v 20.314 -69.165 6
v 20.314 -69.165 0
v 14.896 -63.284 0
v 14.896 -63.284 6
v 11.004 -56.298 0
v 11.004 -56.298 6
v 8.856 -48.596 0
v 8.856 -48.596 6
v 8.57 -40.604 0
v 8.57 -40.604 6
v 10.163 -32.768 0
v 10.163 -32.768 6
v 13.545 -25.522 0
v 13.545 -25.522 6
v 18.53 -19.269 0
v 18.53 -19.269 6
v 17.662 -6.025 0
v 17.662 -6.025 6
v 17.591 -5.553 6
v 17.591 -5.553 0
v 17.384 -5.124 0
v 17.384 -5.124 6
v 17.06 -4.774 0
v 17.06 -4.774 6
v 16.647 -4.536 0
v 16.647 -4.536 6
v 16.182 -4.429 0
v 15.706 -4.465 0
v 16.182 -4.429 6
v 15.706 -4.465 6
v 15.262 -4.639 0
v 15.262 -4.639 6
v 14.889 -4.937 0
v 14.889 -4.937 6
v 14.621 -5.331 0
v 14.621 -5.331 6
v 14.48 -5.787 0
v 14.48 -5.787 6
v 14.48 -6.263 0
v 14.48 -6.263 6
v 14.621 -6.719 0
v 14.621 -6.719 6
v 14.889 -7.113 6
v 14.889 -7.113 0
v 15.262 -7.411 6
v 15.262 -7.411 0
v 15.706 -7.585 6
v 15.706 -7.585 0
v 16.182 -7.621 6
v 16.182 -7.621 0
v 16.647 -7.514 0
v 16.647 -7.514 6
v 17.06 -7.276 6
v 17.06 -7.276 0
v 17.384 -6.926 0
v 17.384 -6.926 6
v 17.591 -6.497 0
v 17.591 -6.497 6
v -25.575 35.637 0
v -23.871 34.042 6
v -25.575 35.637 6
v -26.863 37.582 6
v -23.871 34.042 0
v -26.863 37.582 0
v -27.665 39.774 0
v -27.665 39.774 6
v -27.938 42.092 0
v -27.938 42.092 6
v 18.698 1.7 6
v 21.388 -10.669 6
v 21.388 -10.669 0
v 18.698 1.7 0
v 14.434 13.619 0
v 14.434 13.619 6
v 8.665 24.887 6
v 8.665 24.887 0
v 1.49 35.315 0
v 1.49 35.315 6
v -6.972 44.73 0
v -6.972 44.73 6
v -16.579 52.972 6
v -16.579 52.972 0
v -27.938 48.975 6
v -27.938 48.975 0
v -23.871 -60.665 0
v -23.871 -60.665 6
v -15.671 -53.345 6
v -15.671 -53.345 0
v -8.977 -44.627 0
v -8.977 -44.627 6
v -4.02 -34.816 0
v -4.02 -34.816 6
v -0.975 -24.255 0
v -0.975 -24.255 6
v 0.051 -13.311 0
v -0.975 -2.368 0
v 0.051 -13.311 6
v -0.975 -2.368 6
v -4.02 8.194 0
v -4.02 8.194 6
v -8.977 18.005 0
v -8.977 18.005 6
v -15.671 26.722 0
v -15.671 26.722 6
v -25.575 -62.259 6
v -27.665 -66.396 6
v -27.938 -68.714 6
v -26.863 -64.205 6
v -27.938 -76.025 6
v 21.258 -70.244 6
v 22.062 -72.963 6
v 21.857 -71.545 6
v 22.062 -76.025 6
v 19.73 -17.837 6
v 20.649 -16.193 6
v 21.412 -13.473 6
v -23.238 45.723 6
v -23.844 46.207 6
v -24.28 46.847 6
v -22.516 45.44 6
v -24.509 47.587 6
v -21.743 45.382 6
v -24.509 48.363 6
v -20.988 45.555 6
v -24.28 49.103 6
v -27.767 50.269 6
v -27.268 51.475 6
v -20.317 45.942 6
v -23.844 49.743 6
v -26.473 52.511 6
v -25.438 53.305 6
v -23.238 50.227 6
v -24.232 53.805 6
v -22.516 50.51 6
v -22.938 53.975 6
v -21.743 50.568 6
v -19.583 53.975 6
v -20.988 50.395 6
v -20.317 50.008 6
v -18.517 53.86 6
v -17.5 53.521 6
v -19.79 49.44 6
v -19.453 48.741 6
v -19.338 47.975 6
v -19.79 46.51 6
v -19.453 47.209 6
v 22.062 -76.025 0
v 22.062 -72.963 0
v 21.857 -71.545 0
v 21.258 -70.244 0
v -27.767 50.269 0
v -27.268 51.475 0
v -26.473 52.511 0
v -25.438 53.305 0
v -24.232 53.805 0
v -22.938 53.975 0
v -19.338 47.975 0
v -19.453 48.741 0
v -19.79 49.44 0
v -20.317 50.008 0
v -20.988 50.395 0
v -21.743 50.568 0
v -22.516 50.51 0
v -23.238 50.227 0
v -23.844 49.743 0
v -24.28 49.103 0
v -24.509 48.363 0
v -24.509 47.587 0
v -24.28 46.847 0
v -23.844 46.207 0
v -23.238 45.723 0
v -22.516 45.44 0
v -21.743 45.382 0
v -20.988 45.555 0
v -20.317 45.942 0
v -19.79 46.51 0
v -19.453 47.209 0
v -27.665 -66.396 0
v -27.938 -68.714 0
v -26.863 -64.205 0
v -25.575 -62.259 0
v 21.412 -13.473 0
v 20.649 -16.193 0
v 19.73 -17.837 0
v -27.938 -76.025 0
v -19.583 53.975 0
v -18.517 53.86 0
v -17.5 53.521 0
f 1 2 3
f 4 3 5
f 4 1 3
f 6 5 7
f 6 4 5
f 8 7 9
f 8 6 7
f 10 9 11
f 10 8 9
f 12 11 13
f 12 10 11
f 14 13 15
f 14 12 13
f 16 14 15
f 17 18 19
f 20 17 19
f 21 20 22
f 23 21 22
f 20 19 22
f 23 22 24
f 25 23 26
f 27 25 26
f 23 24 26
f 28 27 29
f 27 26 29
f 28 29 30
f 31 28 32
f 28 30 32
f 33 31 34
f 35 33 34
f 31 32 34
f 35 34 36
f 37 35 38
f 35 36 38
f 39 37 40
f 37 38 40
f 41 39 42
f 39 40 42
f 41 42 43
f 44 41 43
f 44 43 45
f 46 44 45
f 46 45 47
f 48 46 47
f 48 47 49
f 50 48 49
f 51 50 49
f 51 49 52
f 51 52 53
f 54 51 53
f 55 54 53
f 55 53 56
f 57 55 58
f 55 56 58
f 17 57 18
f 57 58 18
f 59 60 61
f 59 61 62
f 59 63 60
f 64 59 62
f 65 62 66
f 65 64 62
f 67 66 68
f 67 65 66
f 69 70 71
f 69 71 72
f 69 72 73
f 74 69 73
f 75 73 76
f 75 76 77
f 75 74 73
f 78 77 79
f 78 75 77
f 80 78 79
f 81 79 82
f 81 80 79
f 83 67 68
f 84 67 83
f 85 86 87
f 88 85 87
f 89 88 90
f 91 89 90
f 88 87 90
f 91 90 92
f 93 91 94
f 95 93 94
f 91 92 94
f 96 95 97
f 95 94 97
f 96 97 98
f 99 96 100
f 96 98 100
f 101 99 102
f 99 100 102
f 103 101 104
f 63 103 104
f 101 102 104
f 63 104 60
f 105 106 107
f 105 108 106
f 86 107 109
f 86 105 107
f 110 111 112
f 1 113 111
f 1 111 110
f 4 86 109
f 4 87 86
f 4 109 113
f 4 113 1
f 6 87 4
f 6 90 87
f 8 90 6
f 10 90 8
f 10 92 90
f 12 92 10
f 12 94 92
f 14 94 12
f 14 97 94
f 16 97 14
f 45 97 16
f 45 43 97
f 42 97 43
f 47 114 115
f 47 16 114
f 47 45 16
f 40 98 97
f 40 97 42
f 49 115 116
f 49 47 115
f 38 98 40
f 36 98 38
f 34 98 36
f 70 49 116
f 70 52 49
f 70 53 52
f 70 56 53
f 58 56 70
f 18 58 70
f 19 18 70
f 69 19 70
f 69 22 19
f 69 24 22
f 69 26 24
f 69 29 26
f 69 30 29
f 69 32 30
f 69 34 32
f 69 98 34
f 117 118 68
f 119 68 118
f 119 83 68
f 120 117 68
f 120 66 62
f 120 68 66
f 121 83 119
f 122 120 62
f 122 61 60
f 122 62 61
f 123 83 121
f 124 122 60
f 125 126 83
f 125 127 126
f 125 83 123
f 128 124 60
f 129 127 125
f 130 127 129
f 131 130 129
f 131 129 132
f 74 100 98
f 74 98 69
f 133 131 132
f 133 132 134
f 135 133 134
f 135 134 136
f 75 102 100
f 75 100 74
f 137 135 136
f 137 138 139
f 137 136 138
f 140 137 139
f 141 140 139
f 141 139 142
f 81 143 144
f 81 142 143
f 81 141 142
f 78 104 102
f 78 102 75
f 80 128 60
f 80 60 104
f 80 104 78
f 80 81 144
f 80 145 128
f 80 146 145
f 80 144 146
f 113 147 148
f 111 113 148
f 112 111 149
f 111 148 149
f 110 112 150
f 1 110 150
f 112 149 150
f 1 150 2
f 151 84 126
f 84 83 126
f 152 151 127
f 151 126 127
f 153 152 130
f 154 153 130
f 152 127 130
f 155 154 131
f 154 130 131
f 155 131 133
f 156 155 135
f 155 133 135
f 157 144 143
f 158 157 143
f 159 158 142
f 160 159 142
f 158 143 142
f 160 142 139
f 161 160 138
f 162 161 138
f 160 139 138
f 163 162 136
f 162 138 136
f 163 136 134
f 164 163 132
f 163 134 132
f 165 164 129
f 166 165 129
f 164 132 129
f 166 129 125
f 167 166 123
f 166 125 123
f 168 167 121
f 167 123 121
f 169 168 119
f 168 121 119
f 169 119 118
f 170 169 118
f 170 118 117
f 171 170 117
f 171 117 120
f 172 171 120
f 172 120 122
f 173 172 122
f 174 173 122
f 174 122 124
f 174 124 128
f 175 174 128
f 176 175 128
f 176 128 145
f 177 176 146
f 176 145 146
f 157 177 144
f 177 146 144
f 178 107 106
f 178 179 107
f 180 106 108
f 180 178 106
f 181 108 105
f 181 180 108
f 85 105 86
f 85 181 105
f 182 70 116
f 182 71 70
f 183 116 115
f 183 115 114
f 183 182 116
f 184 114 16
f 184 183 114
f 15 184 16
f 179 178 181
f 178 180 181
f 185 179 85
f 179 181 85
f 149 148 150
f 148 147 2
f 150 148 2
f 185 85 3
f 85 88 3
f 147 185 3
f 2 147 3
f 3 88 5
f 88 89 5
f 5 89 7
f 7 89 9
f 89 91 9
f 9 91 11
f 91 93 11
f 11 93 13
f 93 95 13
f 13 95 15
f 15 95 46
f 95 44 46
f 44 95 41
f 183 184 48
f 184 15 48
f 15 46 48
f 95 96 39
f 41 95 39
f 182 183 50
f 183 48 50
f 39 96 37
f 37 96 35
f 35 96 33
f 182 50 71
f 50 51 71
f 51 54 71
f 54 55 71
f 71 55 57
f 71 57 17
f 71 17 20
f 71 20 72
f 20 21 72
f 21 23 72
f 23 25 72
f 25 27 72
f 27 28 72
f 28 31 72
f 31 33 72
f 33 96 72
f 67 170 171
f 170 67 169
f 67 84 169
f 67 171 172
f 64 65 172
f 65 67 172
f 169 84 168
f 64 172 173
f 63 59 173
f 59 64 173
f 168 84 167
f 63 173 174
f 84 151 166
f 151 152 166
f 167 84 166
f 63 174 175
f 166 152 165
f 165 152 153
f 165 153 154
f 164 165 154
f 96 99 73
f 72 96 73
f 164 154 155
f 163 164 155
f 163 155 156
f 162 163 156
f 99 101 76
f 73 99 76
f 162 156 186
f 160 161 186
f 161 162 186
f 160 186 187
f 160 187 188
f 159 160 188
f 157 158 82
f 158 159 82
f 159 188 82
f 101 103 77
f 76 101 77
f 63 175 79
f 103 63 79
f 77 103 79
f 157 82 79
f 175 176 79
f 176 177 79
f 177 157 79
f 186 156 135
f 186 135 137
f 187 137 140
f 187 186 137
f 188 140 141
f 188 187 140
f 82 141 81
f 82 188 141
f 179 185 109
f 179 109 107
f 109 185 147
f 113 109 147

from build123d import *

# Parameters (mm, degrees)
ESQUISSE1_W             = 50
ESQUISSE1_H             = 130
EXTRUSION1_DEPTH        = 6
ESQUISSE3_R             = 2.6
ESQUISSE3_R_2           = 1.6
ENL_V_MAT_EXTRU_1_DEPTH = 6
ENL_V_MAT_EXTRU_2_DEPTH = 20
CONG_1_R                = 10
CONG_2_R                = 5


with BuildPart() as part:
    # Esquisse1 → Extrusion1 (new body)
    with BuildSketch(Plane.XY):
        with Locations((-2.937764085, -11.025)):
            Rectangle(ESQUISSE1_W, ESQUISSE1_H)
    extrude(amount=EXTRUSION1_DEPTH)

    # Esquisse3 → Enlèv. mat.-Extru.1 (cut)
    with BuildSketch(Plane.XY.offset(6)):
        with Locations((-21.937764085, 47.975)):
            Circle(ESQUISSE3_R)
        with Locations((16.062235915, -6.025)):
            Circle(ESQUISSE3_R_2)
        Polygon((-7.937764085, 53.975), (22.062235915, 3.975), (22.062235915, 53.975), align=None)
    extrude(amount=-ENL_V_MAT_EXTRU_1_DEPTH, mode=Mode.SUBTRACT)

    # Esquisse4 → Enlèv. mat.-Extru.2 (cut)
    with BuildSketch(Plane.XY.offset(6)):
        with BuildLine():
            Line((-27.937764085, 36.785641628), (-27.937764085, -63.408020344))
            ThreePointArc((-27.937764085, -63.408020344), (0.051382603, -13.311189358), (-27.937764085, 36.785641628))
        make_face()
        with BuildLine():
            Line((-17.937764085, 53.975), (9.122584116, 53.975))
            Line((9.122584116, 53.975), (35.098718701, 7.628755869))
            Line((35.098718701, 7.628755869), (22.062235915, -70.564710485))
            ThreePointArc((22.062235915, -70.564710485), (8.455247334, -43.39579421), (22.062235915, -16.226877934))
            ThreePointArc((22.062235915, -16.226877934), (9.650339, 23.197650833), (-17.937764085, 53.975))
        make_face()
    extrude(amount=-ENL_V_MAT_EXTRU_2_DEPTH, mode=Mode.SUBTRACT)

    # Congé1
    cong_1_edges = [part.edges().sort_by_distance(p)[0] for p in [
        (-27.937764085, 36.785641628, 3),
        (-27.937764085, -63.408020344, 3),
        (22.062235915, -16.226877934, 3),
    ]]
    fillet(cong_1_edges, radius=CONG_1_R)

    # Congé2
    cong_2_edges = [part.edges().sort_by_distance(p)[0] for p in [
        (22.062235915, -70.564710485, 3),
        (-17.937764085, 53.975, 3),
        (-27.937764085, 53.975, 3),
    ]]
    fillet(cong_2_edges, radius=CONG_2_R)


solid = part.part
